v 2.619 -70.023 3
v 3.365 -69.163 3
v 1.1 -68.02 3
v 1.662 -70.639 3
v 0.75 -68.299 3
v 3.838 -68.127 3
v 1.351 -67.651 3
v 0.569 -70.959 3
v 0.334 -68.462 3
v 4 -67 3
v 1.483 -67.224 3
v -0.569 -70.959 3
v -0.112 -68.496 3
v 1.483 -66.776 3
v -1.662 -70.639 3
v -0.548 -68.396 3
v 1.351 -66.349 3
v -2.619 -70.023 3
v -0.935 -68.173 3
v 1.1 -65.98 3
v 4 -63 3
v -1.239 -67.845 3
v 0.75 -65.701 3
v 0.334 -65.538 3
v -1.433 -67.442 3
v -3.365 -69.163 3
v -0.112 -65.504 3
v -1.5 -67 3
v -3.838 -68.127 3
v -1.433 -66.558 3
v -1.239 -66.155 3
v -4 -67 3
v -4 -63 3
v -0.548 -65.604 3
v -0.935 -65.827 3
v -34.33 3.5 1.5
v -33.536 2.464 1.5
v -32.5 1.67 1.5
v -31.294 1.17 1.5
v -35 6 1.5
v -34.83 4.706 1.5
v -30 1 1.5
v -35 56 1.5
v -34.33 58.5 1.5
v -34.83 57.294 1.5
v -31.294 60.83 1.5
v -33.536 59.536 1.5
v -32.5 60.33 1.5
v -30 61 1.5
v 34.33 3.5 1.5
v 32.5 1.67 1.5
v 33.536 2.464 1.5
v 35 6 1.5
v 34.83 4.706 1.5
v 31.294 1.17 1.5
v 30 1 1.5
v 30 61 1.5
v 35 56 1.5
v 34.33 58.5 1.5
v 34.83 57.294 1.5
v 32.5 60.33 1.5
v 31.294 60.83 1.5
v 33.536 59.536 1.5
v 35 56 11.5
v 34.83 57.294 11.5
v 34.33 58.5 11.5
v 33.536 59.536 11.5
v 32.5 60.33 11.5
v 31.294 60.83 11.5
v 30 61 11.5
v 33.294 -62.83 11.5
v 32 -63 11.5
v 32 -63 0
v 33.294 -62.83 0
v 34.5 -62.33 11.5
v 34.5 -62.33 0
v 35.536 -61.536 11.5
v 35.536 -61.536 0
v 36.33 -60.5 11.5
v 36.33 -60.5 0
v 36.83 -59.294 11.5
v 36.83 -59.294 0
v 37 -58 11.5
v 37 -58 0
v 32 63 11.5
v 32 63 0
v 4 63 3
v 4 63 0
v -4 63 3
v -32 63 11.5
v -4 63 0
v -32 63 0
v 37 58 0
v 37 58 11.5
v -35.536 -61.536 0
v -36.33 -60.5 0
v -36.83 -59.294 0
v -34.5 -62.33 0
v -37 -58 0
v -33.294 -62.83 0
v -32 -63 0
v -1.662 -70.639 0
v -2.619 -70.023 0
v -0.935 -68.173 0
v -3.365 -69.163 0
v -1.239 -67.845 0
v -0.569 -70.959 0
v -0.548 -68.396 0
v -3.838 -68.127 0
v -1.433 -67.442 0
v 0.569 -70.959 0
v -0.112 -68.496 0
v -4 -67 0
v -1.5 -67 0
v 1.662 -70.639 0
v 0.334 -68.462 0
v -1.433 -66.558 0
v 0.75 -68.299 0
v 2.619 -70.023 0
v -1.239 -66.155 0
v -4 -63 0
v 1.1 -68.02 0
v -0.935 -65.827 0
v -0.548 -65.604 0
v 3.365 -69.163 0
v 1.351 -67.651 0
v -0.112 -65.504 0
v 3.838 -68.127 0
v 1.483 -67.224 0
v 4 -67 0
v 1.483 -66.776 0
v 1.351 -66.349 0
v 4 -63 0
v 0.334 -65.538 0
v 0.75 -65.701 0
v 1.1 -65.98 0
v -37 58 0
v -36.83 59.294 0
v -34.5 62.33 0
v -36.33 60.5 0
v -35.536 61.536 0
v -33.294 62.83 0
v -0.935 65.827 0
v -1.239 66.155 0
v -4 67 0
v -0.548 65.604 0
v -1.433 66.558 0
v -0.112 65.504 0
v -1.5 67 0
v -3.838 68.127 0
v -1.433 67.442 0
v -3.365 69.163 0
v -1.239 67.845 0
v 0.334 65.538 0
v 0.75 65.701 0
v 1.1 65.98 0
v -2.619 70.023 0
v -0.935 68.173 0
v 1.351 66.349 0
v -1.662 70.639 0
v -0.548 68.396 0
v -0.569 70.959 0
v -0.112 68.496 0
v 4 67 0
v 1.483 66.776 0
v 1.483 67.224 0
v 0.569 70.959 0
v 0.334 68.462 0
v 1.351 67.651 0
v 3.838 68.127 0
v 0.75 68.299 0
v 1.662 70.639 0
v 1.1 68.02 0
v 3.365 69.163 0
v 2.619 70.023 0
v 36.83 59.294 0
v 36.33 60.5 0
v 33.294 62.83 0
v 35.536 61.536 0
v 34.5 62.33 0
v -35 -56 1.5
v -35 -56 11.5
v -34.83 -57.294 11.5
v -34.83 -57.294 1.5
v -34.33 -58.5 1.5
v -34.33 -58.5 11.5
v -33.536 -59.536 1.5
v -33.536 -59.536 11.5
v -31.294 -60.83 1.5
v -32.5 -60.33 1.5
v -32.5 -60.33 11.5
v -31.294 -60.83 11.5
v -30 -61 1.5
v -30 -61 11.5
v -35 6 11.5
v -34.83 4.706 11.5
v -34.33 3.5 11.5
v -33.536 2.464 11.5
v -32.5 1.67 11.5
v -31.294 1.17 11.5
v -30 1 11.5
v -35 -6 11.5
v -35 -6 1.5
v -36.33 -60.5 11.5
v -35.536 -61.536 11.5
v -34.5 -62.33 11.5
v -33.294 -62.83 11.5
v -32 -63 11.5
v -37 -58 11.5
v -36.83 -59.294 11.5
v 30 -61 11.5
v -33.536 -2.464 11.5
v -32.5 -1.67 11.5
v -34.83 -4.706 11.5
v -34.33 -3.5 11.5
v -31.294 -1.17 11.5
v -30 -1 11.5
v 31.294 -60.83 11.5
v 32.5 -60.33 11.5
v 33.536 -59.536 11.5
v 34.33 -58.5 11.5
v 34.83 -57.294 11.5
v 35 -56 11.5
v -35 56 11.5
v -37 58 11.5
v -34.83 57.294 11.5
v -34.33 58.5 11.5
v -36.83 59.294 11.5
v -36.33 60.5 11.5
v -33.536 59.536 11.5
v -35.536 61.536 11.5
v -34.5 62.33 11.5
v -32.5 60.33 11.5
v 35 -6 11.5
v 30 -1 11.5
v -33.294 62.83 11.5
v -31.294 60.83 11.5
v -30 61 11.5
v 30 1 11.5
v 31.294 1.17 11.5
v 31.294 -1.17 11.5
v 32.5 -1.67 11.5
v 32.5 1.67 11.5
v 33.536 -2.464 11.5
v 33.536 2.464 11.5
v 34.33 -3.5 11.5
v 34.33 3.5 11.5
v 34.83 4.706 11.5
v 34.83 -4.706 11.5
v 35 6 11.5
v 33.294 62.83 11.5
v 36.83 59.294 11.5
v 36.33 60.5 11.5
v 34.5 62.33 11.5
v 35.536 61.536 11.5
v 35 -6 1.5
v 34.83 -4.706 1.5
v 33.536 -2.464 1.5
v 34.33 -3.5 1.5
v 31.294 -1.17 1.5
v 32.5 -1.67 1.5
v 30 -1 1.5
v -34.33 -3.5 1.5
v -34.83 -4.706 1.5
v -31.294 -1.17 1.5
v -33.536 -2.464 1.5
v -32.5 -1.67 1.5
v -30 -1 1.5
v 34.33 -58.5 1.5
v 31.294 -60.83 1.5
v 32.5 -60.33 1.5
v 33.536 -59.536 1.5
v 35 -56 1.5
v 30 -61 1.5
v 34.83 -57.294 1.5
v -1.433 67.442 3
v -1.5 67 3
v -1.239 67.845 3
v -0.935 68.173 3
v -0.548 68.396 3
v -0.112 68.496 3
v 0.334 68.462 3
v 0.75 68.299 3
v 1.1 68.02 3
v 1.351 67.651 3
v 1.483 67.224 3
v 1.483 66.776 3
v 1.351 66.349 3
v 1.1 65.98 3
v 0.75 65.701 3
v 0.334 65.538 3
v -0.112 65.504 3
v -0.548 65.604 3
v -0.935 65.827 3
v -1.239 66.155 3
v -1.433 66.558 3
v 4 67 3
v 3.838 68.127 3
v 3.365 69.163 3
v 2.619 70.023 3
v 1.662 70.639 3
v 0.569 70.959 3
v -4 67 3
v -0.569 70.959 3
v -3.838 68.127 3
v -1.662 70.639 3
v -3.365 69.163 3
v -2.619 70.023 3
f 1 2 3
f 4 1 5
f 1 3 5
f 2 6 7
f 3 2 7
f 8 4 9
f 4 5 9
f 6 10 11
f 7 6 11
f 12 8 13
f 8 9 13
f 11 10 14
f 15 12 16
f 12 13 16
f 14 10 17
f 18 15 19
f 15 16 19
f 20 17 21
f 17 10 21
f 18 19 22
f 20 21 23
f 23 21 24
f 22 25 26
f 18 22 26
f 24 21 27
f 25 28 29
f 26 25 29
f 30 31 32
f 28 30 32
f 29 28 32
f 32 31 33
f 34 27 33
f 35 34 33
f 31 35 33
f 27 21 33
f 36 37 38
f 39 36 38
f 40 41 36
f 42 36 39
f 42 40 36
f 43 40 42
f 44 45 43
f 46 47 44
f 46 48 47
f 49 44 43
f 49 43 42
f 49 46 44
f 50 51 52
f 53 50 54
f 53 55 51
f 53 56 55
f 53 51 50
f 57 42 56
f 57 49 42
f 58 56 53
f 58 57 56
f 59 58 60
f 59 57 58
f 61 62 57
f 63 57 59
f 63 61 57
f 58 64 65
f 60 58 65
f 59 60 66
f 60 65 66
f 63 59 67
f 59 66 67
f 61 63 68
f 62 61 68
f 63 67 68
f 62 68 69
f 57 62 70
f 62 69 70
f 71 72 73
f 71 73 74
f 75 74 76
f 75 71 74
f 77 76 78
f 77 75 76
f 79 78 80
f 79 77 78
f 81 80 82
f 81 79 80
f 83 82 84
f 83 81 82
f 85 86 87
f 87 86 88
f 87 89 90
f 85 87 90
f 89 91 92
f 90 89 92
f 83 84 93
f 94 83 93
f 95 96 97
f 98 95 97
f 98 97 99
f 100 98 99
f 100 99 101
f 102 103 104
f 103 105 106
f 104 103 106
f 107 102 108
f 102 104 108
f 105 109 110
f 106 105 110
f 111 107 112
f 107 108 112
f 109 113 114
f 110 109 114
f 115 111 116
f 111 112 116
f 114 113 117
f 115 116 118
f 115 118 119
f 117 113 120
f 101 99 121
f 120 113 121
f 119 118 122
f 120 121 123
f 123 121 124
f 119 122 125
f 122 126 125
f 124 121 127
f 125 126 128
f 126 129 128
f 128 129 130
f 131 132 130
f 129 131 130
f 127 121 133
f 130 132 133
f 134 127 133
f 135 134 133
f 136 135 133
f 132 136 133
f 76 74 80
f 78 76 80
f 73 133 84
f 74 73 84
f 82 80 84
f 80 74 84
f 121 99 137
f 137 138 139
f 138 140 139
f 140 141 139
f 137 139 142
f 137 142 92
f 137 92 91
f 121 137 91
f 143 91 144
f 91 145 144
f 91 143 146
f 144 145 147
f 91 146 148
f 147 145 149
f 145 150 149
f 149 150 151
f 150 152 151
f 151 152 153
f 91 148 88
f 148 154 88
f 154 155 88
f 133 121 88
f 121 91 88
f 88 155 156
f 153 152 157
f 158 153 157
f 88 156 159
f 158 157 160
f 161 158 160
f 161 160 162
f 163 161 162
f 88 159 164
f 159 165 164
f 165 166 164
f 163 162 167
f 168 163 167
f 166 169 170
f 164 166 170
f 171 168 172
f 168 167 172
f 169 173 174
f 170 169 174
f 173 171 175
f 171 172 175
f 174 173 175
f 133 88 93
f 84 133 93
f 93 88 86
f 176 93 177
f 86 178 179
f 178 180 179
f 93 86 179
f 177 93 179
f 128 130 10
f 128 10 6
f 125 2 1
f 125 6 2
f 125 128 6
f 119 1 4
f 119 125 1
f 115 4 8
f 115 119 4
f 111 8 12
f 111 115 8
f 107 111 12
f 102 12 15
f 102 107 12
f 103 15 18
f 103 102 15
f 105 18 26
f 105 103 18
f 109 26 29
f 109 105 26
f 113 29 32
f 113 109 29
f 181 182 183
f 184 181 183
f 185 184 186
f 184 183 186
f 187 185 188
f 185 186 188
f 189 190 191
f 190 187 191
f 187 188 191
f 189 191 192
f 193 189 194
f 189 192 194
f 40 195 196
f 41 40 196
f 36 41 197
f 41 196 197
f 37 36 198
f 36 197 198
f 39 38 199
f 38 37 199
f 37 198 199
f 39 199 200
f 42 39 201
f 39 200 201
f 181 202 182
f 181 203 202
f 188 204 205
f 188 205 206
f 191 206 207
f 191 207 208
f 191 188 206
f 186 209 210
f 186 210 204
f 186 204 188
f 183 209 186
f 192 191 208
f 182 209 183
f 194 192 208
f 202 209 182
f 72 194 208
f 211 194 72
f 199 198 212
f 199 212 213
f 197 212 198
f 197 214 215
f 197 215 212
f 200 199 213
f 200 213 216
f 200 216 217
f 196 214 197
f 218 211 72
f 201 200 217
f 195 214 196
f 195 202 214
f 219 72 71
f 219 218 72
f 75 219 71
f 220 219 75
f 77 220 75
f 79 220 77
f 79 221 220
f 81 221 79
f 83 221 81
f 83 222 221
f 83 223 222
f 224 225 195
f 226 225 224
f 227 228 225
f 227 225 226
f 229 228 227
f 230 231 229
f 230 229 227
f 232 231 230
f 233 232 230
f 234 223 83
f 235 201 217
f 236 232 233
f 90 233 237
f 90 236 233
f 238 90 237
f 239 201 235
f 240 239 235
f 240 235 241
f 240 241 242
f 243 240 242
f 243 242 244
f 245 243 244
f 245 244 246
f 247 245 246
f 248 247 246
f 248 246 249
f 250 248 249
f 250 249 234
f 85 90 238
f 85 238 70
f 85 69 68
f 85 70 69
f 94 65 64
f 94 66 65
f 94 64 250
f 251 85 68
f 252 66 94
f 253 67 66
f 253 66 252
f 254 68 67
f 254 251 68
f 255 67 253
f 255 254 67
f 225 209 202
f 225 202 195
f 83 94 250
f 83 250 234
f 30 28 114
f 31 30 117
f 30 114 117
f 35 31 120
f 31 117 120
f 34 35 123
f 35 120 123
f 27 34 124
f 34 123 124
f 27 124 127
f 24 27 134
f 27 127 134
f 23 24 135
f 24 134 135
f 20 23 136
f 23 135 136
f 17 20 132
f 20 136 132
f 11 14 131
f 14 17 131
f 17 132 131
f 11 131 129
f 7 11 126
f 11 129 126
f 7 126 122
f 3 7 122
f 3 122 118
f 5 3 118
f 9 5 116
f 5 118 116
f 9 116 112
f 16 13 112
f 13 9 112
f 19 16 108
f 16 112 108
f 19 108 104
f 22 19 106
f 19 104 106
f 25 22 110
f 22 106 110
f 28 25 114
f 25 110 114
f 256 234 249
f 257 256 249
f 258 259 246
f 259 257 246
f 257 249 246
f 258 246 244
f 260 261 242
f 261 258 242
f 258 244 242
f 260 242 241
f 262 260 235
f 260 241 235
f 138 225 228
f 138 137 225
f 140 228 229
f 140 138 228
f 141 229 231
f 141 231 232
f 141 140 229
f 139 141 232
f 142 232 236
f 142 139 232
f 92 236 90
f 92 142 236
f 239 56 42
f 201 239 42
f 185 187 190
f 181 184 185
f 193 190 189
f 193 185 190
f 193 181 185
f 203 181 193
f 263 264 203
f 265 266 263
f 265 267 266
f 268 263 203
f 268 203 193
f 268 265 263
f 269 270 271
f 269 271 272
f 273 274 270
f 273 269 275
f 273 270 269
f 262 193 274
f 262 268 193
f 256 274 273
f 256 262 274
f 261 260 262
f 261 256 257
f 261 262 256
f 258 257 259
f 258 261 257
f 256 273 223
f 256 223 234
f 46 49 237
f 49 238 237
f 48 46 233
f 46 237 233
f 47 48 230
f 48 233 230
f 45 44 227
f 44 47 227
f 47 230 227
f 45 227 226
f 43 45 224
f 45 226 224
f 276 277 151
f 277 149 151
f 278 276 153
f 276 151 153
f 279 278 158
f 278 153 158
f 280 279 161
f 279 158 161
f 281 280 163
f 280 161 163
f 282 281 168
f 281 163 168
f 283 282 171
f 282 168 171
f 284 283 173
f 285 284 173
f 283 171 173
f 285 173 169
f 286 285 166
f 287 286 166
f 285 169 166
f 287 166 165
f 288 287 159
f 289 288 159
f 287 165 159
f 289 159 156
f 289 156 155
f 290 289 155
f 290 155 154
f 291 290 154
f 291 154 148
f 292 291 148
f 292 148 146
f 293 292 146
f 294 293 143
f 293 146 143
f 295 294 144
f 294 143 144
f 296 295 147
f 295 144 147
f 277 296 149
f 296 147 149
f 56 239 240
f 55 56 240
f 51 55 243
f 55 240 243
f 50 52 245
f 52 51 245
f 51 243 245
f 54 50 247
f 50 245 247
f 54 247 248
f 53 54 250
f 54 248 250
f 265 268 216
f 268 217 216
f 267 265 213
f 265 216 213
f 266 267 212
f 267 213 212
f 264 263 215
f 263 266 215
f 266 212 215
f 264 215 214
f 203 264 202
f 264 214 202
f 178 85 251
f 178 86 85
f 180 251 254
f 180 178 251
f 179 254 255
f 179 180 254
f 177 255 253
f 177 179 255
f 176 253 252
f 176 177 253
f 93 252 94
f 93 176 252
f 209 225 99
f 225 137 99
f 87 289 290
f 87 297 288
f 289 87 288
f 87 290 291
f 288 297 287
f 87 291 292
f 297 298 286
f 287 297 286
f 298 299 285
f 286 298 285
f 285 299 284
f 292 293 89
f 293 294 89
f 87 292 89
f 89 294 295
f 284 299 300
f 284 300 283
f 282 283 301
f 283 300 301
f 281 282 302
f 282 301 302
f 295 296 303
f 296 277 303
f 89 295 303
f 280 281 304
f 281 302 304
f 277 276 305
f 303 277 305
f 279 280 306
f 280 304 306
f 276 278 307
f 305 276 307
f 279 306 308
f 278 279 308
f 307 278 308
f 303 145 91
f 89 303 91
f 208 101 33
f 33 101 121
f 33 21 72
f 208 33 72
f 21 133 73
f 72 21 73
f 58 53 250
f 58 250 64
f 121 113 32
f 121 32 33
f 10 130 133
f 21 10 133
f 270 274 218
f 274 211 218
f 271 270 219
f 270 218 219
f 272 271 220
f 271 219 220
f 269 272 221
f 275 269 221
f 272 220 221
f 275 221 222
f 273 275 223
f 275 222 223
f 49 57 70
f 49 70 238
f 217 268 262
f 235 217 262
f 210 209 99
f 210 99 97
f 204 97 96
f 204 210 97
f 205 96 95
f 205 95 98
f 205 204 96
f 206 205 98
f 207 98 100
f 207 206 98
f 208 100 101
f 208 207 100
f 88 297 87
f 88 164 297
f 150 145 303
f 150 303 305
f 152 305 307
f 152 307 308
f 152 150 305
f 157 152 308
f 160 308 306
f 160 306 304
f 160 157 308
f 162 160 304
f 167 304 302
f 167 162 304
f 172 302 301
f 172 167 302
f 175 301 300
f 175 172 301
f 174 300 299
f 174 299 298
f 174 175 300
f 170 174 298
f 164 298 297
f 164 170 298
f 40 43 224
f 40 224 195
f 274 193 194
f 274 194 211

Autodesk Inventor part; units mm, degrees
ref_plane "YZ Plane" through (0, 0, 0) normal (1, 0, 0) x (0, 1, 0)
ref_plane "XZ Plane" through (0, 0, 0) normal (0, 1, 0) x (-1, 0, 0)
ref_plane "XY Plane" through (0, 0, 0) normal (0, 0, 1) x (1, 0, 0)
sketch "Sketch1" plane through (0, 0, 0) normal (0, 0, 1) x (1, 0, 0)
  line L0 (-37, -63) -> (37, -63)
  line L1 (37, -63) -> (37, 63)
  line L2 (37, 63) -> (-37, 63)
  line L3 (-37, 63) -> (-37, -63)
  line L4 (-37, -63) -> (37, 63) construction
  line L5 (37, -63) -> (-37, 63) construction
  point P0 (0, 0)
  dimension "d0" = 74
  dimension "d1" = 126
extrude "Extrusion1" add sketch "Sketch1" along normal blind 1.5
sketch "Sketch2" plane through (0, 0, 1.5) normal (0, 0, 1) x (1, 0, 0)
  line L0 (37, -63) -> (37, 63) projected
  line L1 (-37, -63) -> (37, -63)
  line L2 (37, -63) -> (37, 63)
  line L3 (37, 63) -> (-37, 63)
  line L4 (-37, 63) -> (-37, -63)
  line L5 (-37, -63) -> (37, 63) construction
  line L6 (37, -63) -> (-37, 63) construction
  line L7 (-35, -61) -> (35, -61)
  line L8 (35, -61) -> (35, 61)
  line L9 (35, 61) -> (-35, 61)
  line L10 (-35, 61) -> (-35, -61)
  line L11 (-35, -61) -> (35, 61) construction
  line L12 (35, -61) -> (-35, 61) construction
  line L13 (-35, -1) -> (35, -1)
  line L14 (35, -1) -> (35, 1)
  line L15 (35, 1) -> (-35, 1)
  line L16 (-35, 1) -> (-35, -1)
  line L17 (-35, -1) -> (35, 1) construction
  line L18 (35, -1) -> (-35, 1) construction
  point P0 (0, 0)
  dimension "d4" = 70
  dimension "d5" = 122
  dimension "d6" = 2
extrude "Extrusion2" add sketch "Sketch2" along normal blind 10 contours L1 L4 L3 L0 | L10 L15 L8 L13
fillet "Fillet1" radius 5 12 edges at (37, 63, 5.75) (-37, 63, 5.75) (37, -63, 5.75) (-37, -63, 5.75) (-35, 61, 6.5) (35, 61, 6.5) (35, 1, 6.5) (35, -1, 6.5) (-35, 1, 6.5) (-35, -1, 6.5) (-35, -61, 6.5) (35, -61, 6.5)
sketch "Sketch3" plane through (0, 0, 0) normal (0, 0, -1) x (-1, 0, 0)
  line L0 (-32, 63) -> (32, 63) projected
  line L1 (0, 63) -> (0, 71)
  circle A0 centre (0, 67) radius 4
  circle A1 centre (0, 67) radius 1.5
  line L2 (-4, 67) -> (4, 67)
  line L3 (4, 67) -> (4, 63)
  line L4 (-4, 67) -> (-4, 63)
  line L5 (-53.0047, 0) -> (53.0047, 0)
  line L6 (-30, 1) -> (30, 1) projected
  line L7 (0, -63) -> (0, -71)
  circle A2 centre (0, -67) radius 4
  circle A3 centre (0, -67) radius 1.5
  line L8 (-4, -67) -> (4, -67)
  line L9 (4, -67) -> (4, -63)
  line L10 (-4, -67) -> (-4, -63)
  line L11 (-30, -1) -> (30, -1)
  line L12 (4, -63) -> (-4, -63)
  line L13 (32, -63) -> (-32, -63) projected
  point P0 (0, 0)
  dimension "d11" = 8
  dimension "d10" = 8
  dimension "d12" = 3
extrude "Extrusion3" add sketch "Sketch3" against normal blind 3 contours L4 A0 L0 | A0 L3 L0 | A0 L2 A1 L1 | L1 A1 L2 A0 | A0 L1 A1 L2 | L2 A1 L1 A0 | A2 L8 A3 L7 | L12 L9 A2 | L7 A3 L8 A2 | A2 L10 L12 | A2 L7 A3 L8 | L8 A3 L7 A2
properties part number "box store"
